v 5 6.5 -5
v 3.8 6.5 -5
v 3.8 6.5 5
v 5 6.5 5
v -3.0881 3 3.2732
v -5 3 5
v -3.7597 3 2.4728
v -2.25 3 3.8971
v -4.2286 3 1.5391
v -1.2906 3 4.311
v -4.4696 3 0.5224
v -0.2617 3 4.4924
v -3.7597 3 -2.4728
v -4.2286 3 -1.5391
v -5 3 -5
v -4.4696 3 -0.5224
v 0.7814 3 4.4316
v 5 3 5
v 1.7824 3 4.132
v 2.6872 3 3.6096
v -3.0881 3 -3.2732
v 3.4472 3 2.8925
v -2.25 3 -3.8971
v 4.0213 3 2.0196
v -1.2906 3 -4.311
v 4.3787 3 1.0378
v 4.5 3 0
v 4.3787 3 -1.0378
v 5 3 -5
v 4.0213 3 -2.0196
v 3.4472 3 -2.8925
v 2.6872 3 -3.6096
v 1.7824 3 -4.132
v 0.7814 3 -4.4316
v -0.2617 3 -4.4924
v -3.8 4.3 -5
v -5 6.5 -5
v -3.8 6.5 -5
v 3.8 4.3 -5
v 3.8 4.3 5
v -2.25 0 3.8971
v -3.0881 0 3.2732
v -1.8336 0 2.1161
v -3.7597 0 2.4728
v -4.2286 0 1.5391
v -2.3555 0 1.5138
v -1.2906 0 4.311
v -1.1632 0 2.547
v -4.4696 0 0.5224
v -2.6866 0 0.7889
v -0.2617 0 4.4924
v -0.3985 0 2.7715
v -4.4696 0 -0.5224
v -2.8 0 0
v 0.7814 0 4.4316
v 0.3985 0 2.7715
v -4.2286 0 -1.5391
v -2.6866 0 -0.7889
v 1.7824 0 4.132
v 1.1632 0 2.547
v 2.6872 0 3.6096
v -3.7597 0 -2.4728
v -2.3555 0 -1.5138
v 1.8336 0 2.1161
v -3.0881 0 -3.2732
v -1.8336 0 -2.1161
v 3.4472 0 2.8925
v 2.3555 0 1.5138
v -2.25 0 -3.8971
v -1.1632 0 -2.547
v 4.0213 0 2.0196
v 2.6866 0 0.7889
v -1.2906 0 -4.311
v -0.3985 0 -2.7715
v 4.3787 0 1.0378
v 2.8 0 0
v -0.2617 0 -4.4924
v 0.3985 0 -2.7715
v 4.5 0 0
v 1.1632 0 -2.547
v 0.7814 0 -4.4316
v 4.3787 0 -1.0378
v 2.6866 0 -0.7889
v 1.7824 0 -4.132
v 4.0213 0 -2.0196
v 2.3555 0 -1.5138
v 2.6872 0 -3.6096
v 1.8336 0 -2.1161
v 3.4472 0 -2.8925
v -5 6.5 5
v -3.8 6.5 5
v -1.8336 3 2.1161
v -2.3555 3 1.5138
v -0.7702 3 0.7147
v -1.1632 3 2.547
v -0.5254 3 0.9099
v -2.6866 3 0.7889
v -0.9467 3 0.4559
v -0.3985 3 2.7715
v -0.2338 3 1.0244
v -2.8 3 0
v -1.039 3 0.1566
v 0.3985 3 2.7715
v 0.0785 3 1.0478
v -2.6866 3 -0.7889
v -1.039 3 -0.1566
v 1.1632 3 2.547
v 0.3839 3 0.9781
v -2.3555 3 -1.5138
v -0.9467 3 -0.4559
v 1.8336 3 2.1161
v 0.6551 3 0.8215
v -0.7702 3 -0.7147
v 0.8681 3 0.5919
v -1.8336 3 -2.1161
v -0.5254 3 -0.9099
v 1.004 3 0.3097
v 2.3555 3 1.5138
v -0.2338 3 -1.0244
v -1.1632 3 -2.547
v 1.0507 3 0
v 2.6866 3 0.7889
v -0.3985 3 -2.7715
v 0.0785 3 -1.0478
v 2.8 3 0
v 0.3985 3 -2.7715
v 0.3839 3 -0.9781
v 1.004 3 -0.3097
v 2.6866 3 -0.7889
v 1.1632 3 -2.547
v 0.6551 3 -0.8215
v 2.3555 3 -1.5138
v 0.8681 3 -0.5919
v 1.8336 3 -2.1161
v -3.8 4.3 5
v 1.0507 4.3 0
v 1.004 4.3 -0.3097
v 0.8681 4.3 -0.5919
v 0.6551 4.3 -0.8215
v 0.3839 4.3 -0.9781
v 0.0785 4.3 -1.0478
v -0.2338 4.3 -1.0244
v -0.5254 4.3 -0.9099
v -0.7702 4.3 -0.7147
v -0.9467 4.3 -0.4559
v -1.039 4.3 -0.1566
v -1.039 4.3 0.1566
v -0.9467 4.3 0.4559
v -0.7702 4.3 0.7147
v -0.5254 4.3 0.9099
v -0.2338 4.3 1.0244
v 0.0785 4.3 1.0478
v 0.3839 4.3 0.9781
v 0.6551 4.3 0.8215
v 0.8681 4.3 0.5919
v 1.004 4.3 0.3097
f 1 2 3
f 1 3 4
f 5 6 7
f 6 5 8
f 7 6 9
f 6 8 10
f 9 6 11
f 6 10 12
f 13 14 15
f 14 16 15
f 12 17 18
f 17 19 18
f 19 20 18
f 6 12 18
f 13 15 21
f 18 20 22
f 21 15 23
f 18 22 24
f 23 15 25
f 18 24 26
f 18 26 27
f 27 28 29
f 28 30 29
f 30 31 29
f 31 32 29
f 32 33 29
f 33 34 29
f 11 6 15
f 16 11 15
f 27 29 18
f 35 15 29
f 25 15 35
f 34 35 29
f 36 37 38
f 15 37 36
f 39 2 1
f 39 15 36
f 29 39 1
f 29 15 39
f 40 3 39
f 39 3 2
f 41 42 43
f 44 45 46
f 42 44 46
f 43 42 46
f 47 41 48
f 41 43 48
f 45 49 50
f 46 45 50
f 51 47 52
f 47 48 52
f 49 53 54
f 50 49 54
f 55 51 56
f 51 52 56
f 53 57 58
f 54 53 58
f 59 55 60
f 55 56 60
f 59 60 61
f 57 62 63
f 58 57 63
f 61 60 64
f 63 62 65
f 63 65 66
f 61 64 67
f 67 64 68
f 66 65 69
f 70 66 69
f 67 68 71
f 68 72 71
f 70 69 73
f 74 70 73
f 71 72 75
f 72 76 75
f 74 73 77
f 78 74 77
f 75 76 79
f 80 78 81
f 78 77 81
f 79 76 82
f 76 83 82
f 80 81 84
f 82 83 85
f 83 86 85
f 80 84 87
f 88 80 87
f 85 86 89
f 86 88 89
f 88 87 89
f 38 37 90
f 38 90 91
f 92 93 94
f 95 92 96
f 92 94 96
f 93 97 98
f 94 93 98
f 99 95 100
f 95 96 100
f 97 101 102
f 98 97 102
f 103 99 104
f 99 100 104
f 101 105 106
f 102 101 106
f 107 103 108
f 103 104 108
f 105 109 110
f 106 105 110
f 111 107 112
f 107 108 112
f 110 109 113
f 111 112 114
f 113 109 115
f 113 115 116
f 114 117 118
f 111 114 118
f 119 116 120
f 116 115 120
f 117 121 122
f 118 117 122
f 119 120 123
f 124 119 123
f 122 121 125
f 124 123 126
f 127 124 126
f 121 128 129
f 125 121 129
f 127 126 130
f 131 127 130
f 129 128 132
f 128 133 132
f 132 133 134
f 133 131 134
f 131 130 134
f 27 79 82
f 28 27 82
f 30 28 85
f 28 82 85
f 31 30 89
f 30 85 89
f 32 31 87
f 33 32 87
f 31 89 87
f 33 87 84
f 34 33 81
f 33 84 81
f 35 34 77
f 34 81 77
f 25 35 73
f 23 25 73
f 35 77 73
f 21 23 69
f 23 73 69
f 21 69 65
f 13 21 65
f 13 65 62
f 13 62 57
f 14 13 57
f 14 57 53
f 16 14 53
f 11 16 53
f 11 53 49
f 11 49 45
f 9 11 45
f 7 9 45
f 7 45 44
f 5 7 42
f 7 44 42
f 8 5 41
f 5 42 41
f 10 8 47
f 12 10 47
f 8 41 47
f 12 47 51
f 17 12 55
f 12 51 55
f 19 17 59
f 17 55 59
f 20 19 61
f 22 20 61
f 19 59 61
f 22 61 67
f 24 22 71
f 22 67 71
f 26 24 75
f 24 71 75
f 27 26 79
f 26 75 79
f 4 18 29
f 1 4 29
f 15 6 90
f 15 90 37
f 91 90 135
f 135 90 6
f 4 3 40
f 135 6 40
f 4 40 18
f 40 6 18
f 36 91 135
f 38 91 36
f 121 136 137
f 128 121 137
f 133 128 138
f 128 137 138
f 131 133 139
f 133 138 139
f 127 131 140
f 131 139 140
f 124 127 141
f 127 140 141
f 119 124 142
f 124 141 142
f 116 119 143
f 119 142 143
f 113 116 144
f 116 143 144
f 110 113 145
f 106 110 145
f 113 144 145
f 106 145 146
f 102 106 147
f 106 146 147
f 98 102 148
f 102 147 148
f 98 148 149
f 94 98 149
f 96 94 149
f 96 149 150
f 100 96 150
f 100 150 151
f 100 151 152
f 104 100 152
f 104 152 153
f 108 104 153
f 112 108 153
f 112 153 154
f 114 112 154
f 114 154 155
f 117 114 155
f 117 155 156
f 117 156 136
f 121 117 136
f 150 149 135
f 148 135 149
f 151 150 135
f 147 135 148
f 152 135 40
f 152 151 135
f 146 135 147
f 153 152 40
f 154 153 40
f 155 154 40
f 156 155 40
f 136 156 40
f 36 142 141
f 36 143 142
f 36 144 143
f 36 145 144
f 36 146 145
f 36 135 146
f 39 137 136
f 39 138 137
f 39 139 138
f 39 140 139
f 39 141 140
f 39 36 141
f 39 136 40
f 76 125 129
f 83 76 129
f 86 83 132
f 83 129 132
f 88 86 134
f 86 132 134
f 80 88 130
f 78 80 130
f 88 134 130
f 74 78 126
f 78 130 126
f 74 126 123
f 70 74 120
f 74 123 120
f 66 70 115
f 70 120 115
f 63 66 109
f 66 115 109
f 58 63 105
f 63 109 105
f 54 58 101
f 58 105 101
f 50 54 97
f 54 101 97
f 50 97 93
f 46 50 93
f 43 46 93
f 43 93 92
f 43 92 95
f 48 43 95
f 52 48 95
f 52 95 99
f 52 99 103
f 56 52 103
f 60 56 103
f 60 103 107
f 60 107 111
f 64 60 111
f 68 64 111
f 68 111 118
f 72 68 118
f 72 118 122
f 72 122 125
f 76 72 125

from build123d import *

# Parameters (mm, degrees)
ESBO_O1_R                = 4.5
RESSALTO_EXTRUS_O1_DEPTH = 3
ESBO_O2_R                = 2.8
CORTE_EXTRUS_O1_DEPTH    = 4
ESBO_O3_W                = 10
ESBO_O3_H                = 10
RESSALTO_EXTRUS_O2_DEPTH = 3.5
ESBO_O4_W                = 7.6
ESBO_O4_H                = 10
CORTE_EXTRUS_O2_DEPTH    = 2.2
ESBO_O5_R                = 1.050702539
CORTE_EXTRUS_O3_DEPTH    = 5.3


with BuildPart() as part:
    # Esboço1 → Ressalto-extrusão1 (new body)
    with BuildSketch(Plane(origin=(0, 0, 0), x_dir=(1, 0, 0), z_dir=(0, 1, 0))):
        Circle(ESBO_O1_R)
    extrude(amount=RESSALTO_EXTRUS_O1_DEPTH)

    # Esboço2 → Corte-extrusão1 (cut, through all)
    with BuildSketch(Plane(origin=(0, 3, 0), x_dir=(1, 0, 0), z_dir=(0, 1, 0))):
        Circle(ESBO_O2_R)
    extrude(amount=-CORTE_EXTRUS_O1_DEPTH, mode=Mode.SUBTRACT)

    # Esboço3 → Ressalto-extrusão2 (add)
    with BuildSketch(Plane(origin=(0, 3, 0), x_dir=(1, 0, 0), z_dir=(0, 1, 0))):
        Rectangle(ESBO_O3_W, ESBO_O3_H)
    extrude(amount=RESSALTO_EXTRUS_O2_DEPTH)

    # Esboço4 → Corte-extrusão2 (cut)
    with BuildSketch(Plane(origin=(0, 6.5, 0), x_dir=(1, 0, 0), z_dir=(0, 1, 0))):
        Rectangle(ESBO_O4_W, ESBO_O4_H)
    extrude(amount=-CORTE_EXTRUS_O2_DEPTH, mode=Mode.SUBTRACT)

    # Esboço5 → Corte-extrusão3 (cut, through all)
    with BuildSketch(Plane(origin=(0, 4.3, 0), x_dir=(1, 0, 0), z_dir=(0, 1, 0))):
        Circle(ESBO_O5_R)
    extrude(amount=-CORTE_EXTRUS_O3_DEPTH, mode=Mode.SUBTRACT)


solid = part.part
